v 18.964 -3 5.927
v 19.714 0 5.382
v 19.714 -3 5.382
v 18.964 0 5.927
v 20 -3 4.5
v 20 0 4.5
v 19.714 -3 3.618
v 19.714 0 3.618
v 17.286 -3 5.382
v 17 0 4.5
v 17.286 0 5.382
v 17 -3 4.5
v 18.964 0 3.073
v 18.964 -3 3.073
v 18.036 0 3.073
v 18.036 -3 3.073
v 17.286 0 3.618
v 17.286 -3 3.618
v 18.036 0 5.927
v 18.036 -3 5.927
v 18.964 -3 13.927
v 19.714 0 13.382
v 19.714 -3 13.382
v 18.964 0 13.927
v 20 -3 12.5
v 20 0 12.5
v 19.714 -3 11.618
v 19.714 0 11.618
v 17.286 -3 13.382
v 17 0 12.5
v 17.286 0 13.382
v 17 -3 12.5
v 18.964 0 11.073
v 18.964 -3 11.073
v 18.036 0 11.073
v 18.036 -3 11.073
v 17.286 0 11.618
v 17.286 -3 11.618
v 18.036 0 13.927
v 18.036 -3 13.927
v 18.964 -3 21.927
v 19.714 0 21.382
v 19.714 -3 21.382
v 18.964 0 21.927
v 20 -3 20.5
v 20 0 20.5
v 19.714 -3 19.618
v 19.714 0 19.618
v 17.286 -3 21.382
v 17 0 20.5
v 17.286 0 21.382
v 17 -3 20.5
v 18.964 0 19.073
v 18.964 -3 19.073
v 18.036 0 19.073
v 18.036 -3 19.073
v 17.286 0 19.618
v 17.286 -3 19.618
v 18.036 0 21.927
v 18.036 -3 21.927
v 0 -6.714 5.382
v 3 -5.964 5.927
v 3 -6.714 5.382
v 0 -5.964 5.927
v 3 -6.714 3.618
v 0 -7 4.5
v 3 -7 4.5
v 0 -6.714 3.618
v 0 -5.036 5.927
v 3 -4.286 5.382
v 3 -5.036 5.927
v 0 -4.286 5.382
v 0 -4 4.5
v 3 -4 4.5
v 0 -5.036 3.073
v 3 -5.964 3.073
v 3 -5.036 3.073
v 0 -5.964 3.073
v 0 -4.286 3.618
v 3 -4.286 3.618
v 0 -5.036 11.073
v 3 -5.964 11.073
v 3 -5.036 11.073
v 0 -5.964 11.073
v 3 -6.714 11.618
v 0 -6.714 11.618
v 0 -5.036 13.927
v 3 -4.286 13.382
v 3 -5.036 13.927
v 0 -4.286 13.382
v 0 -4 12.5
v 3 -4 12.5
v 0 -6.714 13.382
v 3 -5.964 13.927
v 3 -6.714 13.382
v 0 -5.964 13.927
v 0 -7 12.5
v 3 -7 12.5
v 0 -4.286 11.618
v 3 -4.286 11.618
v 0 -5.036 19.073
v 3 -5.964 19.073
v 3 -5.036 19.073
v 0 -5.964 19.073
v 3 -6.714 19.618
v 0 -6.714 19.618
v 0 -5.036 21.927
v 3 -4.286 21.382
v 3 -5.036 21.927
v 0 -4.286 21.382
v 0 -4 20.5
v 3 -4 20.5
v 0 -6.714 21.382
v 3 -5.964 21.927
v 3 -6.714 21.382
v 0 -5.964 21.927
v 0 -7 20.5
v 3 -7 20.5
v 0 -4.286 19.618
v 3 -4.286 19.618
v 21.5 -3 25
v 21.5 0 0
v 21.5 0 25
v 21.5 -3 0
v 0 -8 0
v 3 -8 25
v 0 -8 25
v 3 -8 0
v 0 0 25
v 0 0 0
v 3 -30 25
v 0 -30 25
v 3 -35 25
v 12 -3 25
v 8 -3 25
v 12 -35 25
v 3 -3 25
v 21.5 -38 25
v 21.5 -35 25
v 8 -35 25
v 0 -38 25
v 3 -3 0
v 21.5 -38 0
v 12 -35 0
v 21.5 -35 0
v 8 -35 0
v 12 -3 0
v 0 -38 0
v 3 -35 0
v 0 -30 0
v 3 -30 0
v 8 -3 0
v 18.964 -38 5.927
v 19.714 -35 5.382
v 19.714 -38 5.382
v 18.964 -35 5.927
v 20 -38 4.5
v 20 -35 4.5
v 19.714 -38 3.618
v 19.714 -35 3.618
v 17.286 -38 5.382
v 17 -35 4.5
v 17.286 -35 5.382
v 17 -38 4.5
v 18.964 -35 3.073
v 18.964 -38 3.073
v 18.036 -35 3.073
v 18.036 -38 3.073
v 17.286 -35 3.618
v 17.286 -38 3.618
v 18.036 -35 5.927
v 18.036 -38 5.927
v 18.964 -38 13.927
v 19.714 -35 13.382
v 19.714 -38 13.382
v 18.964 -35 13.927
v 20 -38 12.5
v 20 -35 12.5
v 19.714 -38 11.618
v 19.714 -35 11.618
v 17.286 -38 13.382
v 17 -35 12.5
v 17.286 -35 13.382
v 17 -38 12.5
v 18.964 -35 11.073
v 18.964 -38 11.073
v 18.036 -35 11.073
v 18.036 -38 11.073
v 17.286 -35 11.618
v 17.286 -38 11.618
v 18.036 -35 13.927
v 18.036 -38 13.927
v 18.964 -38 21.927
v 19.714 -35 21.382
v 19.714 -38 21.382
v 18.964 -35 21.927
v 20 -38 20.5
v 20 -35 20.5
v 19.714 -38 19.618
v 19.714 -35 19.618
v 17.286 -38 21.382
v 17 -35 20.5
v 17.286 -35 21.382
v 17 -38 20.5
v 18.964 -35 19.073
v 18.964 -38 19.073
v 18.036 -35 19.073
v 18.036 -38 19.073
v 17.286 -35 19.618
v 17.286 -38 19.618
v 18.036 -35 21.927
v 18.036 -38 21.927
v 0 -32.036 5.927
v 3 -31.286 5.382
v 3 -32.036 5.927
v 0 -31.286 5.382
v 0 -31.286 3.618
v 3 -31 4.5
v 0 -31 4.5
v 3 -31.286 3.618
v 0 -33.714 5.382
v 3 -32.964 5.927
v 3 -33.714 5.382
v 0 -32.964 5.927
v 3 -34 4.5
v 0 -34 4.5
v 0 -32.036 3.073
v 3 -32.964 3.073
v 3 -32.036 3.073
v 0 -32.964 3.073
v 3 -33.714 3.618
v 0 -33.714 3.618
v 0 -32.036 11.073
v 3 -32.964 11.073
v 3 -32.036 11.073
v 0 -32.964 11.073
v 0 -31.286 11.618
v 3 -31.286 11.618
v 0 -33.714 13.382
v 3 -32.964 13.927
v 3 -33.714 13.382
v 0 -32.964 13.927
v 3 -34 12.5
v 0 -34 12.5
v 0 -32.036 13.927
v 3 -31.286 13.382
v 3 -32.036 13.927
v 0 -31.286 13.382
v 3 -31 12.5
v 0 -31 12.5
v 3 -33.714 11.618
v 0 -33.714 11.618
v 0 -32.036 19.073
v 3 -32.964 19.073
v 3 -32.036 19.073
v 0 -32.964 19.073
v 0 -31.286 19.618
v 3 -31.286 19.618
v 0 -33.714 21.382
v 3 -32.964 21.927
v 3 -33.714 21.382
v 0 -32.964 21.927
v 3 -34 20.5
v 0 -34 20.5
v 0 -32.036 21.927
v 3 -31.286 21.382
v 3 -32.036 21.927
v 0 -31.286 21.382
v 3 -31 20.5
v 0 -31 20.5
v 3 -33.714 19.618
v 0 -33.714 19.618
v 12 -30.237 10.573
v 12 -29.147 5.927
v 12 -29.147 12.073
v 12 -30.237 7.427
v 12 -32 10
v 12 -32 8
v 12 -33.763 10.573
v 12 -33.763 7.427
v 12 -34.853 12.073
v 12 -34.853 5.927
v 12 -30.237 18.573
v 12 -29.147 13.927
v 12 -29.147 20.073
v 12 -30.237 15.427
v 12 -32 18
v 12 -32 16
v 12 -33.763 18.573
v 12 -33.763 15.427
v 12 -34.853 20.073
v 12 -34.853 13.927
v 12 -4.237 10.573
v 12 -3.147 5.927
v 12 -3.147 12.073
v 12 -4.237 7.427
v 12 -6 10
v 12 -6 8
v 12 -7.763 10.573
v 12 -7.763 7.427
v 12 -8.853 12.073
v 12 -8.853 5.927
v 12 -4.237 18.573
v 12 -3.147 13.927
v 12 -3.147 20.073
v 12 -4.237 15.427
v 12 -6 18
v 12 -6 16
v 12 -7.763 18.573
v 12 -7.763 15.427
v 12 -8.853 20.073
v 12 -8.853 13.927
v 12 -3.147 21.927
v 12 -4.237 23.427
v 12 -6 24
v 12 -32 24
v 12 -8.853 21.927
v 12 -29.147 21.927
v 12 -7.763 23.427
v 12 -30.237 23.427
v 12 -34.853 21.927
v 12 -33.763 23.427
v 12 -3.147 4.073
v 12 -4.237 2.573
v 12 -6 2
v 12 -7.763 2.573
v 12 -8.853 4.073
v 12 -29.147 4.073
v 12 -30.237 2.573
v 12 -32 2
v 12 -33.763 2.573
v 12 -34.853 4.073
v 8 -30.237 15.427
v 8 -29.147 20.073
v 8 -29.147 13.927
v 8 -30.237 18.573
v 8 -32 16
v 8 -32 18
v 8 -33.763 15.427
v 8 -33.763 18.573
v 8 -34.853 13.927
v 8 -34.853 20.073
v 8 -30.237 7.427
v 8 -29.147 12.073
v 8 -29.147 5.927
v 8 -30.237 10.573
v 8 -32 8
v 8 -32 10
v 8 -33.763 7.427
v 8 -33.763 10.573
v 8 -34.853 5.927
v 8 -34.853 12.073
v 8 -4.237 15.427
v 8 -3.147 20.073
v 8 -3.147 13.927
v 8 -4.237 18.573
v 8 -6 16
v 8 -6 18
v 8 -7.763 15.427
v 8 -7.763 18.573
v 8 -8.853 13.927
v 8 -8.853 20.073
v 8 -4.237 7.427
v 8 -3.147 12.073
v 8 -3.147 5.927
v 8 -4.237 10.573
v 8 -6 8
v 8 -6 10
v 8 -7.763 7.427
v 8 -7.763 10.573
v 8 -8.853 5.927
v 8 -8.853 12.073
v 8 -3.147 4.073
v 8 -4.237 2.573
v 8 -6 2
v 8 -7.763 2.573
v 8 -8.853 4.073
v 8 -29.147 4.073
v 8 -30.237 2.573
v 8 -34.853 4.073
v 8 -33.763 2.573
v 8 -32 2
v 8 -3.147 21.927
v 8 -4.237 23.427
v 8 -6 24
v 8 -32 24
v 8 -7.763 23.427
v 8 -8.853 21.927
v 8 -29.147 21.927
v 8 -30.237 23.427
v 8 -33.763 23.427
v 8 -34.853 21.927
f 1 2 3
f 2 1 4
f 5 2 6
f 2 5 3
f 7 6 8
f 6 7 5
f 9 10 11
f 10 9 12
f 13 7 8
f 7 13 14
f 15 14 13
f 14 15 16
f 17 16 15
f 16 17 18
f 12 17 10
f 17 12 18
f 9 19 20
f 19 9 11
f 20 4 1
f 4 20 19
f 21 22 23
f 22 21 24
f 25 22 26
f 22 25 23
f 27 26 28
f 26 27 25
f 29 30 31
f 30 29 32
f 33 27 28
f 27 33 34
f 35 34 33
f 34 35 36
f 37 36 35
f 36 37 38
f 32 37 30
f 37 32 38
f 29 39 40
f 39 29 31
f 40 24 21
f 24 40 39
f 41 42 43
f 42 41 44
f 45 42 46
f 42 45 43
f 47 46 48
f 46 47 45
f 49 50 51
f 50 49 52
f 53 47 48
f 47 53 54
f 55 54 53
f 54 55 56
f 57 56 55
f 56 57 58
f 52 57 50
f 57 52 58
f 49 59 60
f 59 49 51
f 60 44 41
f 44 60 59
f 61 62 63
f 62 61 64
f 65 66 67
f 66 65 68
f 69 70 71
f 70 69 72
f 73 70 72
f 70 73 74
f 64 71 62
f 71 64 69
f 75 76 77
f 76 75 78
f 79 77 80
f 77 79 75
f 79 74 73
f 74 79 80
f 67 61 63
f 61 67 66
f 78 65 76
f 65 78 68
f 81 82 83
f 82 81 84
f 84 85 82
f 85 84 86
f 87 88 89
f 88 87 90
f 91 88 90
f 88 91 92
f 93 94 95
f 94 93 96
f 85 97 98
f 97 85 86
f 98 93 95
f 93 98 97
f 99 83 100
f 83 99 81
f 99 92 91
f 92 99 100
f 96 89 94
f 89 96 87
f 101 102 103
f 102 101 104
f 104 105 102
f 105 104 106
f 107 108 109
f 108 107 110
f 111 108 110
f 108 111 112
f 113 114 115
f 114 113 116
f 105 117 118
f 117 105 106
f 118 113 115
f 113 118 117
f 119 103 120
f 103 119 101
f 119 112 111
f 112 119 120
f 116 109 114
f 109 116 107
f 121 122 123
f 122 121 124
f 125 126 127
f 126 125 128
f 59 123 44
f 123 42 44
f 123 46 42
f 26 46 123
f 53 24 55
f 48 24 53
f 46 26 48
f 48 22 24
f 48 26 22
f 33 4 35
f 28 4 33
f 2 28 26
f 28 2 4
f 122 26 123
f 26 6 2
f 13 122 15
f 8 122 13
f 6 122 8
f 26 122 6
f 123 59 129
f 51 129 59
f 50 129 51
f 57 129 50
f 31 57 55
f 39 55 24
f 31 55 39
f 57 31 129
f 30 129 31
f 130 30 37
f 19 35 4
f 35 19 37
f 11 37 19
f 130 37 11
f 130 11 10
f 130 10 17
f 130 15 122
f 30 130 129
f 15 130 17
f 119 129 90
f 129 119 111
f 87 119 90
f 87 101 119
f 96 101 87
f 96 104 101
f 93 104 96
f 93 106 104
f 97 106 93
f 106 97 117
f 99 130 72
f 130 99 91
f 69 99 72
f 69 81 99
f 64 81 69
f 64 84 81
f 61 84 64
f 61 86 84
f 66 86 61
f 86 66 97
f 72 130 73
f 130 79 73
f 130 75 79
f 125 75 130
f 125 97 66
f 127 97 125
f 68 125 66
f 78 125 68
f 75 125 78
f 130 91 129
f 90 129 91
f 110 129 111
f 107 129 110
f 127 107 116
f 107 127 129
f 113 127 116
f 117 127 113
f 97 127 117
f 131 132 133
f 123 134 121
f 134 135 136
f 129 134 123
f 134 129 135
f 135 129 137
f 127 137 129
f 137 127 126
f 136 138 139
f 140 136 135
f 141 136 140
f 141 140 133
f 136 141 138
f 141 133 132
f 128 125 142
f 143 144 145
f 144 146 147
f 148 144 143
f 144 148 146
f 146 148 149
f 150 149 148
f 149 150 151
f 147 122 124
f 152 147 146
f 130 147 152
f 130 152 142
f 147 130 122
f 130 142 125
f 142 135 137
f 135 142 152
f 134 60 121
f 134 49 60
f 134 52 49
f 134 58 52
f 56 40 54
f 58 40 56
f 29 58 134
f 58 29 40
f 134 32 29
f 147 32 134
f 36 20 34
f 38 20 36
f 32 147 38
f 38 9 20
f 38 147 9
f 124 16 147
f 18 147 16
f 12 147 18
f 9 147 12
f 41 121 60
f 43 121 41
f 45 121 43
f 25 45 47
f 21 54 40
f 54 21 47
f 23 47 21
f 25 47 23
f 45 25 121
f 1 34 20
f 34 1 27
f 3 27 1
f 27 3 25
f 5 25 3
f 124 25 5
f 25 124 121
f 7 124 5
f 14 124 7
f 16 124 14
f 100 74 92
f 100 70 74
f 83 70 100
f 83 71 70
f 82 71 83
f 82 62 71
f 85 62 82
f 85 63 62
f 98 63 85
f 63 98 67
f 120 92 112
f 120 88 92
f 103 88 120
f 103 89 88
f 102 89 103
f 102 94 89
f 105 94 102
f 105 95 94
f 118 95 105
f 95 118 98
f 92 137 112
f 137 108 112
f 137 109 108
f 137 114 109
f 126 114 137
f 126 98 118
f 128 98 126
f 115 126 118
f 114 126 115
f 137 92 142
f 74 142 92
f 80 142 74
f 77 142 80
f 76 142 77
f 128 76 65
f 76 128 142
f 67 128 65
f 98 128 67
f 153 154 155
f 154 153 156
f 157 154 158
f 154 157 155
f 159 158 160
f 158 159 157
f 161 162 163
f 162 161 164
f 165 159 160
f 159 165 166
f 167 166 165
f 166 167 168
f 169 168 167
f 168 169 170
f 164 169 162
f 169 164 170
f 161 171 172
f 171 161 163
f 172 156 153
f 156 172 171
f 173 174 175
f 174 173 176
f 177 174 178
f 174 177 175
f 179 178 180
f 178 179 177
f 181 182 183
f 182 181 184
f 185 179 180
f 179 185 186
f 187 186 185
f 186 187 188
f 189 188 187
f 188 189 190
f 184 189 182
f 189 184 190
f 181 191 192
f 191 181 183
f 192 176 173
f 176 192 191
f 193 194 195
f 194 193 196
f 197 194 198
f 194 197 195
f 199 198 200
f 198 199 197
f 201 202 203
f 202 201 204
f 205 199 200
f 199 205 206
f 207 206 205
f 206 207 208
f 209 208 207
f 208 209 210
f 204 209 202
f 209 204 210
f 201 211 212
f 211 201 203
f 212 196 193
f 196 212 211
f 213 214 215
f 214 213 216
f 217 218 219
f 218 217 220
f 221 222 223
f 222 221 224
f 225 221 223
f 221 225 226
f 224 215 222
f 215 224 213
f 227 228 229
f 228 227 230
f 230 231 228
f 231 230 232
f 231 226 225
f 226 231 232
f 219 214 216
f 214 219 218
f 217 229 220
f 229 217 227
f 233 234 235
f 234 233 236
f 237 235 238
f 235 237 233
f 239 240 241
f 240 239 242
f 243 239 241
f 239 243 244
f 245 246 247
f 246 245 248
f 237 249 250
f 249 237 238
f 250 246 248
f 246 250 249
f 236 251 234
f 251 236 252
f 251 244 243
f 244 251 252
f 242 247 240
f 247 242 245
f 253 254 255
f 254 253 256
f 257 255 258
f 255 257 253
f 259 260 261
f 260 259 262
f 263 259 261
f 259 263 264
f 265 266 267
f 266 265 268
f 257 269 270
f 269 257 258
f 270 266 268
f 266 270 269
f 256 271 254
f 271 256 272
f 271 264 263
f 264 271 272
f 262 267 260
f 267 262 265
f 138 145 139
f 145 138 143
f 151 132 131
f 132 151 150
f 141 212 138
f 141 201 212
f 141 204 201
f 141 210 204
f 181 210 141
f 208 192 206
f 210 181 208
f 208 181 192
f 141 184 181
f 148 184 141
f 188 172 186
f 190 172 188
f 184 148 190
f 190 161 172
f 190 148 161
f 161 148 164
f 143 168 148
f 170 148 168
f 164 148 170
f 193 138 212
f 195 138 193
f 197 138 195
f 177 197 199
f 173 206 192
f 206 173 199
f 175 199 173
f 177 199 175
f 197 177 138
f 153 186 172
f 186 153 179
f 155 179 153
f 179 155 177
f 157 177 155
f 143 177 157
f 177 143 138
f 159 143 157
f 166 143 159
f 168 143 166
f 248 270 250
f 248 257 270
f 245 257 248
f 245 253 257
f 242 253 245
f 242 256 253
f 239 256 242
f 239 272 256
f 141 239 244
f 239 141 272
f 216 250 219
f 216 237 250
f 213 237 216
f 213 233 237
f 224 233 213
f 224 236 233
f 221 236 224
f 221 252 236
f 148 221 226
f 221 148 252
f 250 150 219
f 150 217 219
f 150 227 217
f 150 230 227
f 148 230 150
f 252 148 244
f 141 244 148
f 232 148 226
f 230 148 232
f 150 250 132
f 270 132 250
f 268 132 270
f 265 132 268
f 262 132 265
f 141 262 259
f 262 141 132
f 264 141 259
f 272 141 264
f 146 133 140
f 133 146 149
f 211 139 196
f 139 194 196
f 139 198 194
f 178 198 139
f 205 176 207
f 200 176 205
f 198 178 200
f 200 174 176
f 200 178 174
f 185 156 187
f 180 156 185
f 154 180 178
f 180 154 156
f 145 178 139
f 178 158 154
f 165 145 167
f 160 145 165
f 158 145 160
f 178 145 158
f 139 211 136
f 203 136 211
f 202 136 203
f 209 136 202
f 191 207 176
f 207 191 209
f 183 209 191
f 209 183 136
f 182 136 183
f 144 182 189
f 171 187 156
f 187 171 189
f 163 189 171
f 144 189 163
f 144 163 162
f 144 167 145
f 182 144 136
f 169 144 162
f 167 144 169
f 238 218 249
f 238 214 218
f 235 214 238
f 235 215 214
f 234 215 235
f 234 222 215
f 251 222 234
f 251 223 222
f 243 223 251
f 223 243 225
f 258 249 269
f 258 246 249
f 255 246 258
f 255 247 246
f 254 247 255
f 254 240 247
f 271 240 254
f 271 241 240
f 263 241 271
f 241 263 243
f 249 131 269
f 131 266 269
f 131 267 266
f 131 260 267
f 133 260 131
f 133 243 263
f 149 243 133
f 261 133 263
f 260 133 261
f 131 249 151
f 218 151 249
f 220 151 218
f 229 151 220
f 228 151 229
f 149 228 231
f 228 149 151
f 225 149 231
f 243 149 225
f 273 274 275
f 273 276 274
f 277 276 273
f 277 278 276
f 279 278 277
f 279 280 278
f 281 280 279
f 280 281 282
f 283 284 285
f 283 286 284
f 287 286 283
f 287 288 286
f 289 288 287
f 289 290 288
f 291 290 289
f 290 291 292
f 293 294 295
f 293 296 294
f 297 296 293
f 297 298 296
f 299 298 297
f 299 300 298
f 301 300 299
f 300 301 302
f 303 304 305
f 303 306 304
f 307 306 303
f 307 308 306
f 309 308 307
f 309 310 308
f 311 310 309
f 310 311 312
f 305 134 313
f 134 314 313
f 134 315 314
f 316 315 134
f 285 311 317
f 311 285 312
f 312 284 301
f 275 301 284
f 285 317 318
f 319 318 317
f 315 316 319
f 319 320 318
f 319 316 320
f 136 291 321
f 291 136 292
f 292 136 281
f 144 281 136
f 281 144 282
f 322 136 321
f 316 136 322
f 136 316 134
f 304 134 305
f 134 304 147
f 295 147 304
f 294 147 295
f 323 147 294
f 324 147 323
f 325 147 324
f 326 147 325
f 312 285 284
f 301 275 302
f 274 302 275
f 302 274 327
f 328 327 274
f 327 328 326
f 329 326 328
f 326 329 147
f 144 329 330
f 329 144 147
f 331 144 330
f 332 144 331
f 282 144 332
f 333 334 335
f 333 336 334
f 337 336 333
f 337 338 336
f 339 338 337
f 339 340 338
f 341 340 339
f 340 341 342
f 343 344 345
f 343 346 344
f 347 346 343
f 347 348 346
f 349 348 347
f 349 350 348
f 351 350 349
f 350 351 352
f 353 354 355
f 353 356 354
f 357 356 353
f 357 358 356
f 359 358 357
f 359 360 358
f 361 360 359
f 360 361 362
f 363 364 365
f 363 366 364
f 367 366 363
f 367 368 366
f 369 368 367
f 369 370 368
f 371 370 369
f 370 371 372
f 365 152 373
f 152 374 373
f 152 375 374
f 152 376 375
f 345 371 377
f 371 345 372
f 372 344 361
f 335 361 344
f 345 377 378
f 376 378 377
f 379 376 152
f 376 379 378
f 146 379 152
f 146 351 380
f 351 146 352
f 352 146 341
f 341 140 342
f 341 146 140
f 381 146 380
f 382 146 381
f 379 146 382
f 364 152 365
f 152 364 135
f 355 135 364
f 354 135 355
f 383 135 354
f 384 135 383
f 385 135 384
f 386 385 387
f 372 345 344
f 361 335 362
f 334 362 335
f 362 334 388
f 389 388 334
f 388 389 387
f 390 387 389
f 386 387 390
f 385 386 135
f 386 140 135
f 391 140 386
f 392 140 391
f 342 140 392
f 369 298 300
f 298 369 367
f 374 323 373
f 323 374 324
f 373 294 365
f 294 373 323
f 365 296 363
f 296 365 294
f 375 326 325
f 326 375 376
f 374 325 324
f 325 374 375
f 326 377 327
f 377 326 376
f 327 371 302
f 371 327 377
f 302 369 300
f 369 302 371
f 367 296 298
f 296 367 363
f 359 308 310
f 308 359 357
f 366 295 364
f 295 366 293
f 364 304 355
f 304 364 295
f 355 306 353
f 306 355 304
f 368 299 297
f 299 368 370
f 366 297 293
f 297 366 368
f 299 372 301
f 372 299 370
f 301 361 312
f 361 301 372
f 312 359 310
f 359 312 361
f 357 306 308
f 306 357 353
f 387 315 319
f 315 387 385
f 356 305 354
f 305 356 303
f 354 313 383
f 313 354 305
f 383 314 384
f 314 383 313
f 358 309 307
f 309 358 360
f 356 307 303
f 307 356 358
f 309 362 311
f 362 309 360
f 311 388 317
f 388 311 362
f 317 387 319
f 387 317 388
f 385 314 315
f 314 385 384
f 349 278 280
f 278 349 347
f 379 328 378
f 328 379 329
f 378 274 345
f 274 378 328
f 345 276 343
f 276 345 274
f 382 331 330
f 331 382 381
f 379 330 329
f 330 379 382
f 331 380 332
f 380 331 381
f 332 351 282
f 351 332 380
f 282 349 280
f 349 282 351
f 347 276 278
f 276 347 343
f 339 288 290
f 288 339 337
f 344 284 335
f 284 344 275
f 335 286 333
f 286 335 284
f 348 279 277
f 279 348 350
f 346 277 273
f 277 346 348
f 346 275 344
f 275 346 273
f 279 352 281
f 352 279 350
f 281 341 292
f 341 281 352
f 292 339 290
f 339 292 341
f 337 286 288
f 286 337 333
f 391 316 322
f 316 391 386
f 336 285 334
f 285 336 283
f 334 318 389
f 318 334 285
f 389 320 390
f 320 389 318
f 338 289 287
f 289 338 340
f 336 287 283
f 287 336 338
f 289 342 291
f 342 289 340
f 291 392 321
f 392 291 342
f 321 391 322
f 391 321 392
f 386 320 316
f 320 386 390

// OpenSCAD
module agujereado(x,y){
	union(){
		for(j=[0:y-1])
		{
			translate([0,j*8,0])
			{
				for(i=[0:x-1])
				{
					translate([8*i,0,-1])cylinder(r=1.5, h=30, $fn=10);
				}
			}
		}
	}
}


module lateral(){
	rotate([90,0,0]) difference(){
		cube([21.5,25,8]);
		translate([3,0,3]) cube([24,25,9]);
		translate([10.5,4.5,0]) agujereado(2,3);
		translate([0,4.5,5.5]) rotate([0,90,0]) agujereado(1,3);
	}
}

difference(){
	union(){
		lateral();
		translate([0,-(11+27),0]) mirror([0,1,0]) lateral();
		translate([8,-38,0]) cube([4,38,25]);
	}
	translate([5,-6,5]) rotate([0,90,0]) cylinder(r=3,h=20);
	translate([5,-6,13]) rotate([0,90,0]) cylinder(r=3,h=20);
	translate([5,-6,21]) rotate([0,90,0]) cylinder(r=3,h=20);
	translate([5,-32,5]) rotate([0,90,0]) cylinder(r=3,h=20);
	translate([5,-32,13]) rotate([0,90,0]) cylinder(r=3,h=20);
	translate([5,-32,21]) rotate([0,90,0]) cylinder(r=3,h=20);
}
